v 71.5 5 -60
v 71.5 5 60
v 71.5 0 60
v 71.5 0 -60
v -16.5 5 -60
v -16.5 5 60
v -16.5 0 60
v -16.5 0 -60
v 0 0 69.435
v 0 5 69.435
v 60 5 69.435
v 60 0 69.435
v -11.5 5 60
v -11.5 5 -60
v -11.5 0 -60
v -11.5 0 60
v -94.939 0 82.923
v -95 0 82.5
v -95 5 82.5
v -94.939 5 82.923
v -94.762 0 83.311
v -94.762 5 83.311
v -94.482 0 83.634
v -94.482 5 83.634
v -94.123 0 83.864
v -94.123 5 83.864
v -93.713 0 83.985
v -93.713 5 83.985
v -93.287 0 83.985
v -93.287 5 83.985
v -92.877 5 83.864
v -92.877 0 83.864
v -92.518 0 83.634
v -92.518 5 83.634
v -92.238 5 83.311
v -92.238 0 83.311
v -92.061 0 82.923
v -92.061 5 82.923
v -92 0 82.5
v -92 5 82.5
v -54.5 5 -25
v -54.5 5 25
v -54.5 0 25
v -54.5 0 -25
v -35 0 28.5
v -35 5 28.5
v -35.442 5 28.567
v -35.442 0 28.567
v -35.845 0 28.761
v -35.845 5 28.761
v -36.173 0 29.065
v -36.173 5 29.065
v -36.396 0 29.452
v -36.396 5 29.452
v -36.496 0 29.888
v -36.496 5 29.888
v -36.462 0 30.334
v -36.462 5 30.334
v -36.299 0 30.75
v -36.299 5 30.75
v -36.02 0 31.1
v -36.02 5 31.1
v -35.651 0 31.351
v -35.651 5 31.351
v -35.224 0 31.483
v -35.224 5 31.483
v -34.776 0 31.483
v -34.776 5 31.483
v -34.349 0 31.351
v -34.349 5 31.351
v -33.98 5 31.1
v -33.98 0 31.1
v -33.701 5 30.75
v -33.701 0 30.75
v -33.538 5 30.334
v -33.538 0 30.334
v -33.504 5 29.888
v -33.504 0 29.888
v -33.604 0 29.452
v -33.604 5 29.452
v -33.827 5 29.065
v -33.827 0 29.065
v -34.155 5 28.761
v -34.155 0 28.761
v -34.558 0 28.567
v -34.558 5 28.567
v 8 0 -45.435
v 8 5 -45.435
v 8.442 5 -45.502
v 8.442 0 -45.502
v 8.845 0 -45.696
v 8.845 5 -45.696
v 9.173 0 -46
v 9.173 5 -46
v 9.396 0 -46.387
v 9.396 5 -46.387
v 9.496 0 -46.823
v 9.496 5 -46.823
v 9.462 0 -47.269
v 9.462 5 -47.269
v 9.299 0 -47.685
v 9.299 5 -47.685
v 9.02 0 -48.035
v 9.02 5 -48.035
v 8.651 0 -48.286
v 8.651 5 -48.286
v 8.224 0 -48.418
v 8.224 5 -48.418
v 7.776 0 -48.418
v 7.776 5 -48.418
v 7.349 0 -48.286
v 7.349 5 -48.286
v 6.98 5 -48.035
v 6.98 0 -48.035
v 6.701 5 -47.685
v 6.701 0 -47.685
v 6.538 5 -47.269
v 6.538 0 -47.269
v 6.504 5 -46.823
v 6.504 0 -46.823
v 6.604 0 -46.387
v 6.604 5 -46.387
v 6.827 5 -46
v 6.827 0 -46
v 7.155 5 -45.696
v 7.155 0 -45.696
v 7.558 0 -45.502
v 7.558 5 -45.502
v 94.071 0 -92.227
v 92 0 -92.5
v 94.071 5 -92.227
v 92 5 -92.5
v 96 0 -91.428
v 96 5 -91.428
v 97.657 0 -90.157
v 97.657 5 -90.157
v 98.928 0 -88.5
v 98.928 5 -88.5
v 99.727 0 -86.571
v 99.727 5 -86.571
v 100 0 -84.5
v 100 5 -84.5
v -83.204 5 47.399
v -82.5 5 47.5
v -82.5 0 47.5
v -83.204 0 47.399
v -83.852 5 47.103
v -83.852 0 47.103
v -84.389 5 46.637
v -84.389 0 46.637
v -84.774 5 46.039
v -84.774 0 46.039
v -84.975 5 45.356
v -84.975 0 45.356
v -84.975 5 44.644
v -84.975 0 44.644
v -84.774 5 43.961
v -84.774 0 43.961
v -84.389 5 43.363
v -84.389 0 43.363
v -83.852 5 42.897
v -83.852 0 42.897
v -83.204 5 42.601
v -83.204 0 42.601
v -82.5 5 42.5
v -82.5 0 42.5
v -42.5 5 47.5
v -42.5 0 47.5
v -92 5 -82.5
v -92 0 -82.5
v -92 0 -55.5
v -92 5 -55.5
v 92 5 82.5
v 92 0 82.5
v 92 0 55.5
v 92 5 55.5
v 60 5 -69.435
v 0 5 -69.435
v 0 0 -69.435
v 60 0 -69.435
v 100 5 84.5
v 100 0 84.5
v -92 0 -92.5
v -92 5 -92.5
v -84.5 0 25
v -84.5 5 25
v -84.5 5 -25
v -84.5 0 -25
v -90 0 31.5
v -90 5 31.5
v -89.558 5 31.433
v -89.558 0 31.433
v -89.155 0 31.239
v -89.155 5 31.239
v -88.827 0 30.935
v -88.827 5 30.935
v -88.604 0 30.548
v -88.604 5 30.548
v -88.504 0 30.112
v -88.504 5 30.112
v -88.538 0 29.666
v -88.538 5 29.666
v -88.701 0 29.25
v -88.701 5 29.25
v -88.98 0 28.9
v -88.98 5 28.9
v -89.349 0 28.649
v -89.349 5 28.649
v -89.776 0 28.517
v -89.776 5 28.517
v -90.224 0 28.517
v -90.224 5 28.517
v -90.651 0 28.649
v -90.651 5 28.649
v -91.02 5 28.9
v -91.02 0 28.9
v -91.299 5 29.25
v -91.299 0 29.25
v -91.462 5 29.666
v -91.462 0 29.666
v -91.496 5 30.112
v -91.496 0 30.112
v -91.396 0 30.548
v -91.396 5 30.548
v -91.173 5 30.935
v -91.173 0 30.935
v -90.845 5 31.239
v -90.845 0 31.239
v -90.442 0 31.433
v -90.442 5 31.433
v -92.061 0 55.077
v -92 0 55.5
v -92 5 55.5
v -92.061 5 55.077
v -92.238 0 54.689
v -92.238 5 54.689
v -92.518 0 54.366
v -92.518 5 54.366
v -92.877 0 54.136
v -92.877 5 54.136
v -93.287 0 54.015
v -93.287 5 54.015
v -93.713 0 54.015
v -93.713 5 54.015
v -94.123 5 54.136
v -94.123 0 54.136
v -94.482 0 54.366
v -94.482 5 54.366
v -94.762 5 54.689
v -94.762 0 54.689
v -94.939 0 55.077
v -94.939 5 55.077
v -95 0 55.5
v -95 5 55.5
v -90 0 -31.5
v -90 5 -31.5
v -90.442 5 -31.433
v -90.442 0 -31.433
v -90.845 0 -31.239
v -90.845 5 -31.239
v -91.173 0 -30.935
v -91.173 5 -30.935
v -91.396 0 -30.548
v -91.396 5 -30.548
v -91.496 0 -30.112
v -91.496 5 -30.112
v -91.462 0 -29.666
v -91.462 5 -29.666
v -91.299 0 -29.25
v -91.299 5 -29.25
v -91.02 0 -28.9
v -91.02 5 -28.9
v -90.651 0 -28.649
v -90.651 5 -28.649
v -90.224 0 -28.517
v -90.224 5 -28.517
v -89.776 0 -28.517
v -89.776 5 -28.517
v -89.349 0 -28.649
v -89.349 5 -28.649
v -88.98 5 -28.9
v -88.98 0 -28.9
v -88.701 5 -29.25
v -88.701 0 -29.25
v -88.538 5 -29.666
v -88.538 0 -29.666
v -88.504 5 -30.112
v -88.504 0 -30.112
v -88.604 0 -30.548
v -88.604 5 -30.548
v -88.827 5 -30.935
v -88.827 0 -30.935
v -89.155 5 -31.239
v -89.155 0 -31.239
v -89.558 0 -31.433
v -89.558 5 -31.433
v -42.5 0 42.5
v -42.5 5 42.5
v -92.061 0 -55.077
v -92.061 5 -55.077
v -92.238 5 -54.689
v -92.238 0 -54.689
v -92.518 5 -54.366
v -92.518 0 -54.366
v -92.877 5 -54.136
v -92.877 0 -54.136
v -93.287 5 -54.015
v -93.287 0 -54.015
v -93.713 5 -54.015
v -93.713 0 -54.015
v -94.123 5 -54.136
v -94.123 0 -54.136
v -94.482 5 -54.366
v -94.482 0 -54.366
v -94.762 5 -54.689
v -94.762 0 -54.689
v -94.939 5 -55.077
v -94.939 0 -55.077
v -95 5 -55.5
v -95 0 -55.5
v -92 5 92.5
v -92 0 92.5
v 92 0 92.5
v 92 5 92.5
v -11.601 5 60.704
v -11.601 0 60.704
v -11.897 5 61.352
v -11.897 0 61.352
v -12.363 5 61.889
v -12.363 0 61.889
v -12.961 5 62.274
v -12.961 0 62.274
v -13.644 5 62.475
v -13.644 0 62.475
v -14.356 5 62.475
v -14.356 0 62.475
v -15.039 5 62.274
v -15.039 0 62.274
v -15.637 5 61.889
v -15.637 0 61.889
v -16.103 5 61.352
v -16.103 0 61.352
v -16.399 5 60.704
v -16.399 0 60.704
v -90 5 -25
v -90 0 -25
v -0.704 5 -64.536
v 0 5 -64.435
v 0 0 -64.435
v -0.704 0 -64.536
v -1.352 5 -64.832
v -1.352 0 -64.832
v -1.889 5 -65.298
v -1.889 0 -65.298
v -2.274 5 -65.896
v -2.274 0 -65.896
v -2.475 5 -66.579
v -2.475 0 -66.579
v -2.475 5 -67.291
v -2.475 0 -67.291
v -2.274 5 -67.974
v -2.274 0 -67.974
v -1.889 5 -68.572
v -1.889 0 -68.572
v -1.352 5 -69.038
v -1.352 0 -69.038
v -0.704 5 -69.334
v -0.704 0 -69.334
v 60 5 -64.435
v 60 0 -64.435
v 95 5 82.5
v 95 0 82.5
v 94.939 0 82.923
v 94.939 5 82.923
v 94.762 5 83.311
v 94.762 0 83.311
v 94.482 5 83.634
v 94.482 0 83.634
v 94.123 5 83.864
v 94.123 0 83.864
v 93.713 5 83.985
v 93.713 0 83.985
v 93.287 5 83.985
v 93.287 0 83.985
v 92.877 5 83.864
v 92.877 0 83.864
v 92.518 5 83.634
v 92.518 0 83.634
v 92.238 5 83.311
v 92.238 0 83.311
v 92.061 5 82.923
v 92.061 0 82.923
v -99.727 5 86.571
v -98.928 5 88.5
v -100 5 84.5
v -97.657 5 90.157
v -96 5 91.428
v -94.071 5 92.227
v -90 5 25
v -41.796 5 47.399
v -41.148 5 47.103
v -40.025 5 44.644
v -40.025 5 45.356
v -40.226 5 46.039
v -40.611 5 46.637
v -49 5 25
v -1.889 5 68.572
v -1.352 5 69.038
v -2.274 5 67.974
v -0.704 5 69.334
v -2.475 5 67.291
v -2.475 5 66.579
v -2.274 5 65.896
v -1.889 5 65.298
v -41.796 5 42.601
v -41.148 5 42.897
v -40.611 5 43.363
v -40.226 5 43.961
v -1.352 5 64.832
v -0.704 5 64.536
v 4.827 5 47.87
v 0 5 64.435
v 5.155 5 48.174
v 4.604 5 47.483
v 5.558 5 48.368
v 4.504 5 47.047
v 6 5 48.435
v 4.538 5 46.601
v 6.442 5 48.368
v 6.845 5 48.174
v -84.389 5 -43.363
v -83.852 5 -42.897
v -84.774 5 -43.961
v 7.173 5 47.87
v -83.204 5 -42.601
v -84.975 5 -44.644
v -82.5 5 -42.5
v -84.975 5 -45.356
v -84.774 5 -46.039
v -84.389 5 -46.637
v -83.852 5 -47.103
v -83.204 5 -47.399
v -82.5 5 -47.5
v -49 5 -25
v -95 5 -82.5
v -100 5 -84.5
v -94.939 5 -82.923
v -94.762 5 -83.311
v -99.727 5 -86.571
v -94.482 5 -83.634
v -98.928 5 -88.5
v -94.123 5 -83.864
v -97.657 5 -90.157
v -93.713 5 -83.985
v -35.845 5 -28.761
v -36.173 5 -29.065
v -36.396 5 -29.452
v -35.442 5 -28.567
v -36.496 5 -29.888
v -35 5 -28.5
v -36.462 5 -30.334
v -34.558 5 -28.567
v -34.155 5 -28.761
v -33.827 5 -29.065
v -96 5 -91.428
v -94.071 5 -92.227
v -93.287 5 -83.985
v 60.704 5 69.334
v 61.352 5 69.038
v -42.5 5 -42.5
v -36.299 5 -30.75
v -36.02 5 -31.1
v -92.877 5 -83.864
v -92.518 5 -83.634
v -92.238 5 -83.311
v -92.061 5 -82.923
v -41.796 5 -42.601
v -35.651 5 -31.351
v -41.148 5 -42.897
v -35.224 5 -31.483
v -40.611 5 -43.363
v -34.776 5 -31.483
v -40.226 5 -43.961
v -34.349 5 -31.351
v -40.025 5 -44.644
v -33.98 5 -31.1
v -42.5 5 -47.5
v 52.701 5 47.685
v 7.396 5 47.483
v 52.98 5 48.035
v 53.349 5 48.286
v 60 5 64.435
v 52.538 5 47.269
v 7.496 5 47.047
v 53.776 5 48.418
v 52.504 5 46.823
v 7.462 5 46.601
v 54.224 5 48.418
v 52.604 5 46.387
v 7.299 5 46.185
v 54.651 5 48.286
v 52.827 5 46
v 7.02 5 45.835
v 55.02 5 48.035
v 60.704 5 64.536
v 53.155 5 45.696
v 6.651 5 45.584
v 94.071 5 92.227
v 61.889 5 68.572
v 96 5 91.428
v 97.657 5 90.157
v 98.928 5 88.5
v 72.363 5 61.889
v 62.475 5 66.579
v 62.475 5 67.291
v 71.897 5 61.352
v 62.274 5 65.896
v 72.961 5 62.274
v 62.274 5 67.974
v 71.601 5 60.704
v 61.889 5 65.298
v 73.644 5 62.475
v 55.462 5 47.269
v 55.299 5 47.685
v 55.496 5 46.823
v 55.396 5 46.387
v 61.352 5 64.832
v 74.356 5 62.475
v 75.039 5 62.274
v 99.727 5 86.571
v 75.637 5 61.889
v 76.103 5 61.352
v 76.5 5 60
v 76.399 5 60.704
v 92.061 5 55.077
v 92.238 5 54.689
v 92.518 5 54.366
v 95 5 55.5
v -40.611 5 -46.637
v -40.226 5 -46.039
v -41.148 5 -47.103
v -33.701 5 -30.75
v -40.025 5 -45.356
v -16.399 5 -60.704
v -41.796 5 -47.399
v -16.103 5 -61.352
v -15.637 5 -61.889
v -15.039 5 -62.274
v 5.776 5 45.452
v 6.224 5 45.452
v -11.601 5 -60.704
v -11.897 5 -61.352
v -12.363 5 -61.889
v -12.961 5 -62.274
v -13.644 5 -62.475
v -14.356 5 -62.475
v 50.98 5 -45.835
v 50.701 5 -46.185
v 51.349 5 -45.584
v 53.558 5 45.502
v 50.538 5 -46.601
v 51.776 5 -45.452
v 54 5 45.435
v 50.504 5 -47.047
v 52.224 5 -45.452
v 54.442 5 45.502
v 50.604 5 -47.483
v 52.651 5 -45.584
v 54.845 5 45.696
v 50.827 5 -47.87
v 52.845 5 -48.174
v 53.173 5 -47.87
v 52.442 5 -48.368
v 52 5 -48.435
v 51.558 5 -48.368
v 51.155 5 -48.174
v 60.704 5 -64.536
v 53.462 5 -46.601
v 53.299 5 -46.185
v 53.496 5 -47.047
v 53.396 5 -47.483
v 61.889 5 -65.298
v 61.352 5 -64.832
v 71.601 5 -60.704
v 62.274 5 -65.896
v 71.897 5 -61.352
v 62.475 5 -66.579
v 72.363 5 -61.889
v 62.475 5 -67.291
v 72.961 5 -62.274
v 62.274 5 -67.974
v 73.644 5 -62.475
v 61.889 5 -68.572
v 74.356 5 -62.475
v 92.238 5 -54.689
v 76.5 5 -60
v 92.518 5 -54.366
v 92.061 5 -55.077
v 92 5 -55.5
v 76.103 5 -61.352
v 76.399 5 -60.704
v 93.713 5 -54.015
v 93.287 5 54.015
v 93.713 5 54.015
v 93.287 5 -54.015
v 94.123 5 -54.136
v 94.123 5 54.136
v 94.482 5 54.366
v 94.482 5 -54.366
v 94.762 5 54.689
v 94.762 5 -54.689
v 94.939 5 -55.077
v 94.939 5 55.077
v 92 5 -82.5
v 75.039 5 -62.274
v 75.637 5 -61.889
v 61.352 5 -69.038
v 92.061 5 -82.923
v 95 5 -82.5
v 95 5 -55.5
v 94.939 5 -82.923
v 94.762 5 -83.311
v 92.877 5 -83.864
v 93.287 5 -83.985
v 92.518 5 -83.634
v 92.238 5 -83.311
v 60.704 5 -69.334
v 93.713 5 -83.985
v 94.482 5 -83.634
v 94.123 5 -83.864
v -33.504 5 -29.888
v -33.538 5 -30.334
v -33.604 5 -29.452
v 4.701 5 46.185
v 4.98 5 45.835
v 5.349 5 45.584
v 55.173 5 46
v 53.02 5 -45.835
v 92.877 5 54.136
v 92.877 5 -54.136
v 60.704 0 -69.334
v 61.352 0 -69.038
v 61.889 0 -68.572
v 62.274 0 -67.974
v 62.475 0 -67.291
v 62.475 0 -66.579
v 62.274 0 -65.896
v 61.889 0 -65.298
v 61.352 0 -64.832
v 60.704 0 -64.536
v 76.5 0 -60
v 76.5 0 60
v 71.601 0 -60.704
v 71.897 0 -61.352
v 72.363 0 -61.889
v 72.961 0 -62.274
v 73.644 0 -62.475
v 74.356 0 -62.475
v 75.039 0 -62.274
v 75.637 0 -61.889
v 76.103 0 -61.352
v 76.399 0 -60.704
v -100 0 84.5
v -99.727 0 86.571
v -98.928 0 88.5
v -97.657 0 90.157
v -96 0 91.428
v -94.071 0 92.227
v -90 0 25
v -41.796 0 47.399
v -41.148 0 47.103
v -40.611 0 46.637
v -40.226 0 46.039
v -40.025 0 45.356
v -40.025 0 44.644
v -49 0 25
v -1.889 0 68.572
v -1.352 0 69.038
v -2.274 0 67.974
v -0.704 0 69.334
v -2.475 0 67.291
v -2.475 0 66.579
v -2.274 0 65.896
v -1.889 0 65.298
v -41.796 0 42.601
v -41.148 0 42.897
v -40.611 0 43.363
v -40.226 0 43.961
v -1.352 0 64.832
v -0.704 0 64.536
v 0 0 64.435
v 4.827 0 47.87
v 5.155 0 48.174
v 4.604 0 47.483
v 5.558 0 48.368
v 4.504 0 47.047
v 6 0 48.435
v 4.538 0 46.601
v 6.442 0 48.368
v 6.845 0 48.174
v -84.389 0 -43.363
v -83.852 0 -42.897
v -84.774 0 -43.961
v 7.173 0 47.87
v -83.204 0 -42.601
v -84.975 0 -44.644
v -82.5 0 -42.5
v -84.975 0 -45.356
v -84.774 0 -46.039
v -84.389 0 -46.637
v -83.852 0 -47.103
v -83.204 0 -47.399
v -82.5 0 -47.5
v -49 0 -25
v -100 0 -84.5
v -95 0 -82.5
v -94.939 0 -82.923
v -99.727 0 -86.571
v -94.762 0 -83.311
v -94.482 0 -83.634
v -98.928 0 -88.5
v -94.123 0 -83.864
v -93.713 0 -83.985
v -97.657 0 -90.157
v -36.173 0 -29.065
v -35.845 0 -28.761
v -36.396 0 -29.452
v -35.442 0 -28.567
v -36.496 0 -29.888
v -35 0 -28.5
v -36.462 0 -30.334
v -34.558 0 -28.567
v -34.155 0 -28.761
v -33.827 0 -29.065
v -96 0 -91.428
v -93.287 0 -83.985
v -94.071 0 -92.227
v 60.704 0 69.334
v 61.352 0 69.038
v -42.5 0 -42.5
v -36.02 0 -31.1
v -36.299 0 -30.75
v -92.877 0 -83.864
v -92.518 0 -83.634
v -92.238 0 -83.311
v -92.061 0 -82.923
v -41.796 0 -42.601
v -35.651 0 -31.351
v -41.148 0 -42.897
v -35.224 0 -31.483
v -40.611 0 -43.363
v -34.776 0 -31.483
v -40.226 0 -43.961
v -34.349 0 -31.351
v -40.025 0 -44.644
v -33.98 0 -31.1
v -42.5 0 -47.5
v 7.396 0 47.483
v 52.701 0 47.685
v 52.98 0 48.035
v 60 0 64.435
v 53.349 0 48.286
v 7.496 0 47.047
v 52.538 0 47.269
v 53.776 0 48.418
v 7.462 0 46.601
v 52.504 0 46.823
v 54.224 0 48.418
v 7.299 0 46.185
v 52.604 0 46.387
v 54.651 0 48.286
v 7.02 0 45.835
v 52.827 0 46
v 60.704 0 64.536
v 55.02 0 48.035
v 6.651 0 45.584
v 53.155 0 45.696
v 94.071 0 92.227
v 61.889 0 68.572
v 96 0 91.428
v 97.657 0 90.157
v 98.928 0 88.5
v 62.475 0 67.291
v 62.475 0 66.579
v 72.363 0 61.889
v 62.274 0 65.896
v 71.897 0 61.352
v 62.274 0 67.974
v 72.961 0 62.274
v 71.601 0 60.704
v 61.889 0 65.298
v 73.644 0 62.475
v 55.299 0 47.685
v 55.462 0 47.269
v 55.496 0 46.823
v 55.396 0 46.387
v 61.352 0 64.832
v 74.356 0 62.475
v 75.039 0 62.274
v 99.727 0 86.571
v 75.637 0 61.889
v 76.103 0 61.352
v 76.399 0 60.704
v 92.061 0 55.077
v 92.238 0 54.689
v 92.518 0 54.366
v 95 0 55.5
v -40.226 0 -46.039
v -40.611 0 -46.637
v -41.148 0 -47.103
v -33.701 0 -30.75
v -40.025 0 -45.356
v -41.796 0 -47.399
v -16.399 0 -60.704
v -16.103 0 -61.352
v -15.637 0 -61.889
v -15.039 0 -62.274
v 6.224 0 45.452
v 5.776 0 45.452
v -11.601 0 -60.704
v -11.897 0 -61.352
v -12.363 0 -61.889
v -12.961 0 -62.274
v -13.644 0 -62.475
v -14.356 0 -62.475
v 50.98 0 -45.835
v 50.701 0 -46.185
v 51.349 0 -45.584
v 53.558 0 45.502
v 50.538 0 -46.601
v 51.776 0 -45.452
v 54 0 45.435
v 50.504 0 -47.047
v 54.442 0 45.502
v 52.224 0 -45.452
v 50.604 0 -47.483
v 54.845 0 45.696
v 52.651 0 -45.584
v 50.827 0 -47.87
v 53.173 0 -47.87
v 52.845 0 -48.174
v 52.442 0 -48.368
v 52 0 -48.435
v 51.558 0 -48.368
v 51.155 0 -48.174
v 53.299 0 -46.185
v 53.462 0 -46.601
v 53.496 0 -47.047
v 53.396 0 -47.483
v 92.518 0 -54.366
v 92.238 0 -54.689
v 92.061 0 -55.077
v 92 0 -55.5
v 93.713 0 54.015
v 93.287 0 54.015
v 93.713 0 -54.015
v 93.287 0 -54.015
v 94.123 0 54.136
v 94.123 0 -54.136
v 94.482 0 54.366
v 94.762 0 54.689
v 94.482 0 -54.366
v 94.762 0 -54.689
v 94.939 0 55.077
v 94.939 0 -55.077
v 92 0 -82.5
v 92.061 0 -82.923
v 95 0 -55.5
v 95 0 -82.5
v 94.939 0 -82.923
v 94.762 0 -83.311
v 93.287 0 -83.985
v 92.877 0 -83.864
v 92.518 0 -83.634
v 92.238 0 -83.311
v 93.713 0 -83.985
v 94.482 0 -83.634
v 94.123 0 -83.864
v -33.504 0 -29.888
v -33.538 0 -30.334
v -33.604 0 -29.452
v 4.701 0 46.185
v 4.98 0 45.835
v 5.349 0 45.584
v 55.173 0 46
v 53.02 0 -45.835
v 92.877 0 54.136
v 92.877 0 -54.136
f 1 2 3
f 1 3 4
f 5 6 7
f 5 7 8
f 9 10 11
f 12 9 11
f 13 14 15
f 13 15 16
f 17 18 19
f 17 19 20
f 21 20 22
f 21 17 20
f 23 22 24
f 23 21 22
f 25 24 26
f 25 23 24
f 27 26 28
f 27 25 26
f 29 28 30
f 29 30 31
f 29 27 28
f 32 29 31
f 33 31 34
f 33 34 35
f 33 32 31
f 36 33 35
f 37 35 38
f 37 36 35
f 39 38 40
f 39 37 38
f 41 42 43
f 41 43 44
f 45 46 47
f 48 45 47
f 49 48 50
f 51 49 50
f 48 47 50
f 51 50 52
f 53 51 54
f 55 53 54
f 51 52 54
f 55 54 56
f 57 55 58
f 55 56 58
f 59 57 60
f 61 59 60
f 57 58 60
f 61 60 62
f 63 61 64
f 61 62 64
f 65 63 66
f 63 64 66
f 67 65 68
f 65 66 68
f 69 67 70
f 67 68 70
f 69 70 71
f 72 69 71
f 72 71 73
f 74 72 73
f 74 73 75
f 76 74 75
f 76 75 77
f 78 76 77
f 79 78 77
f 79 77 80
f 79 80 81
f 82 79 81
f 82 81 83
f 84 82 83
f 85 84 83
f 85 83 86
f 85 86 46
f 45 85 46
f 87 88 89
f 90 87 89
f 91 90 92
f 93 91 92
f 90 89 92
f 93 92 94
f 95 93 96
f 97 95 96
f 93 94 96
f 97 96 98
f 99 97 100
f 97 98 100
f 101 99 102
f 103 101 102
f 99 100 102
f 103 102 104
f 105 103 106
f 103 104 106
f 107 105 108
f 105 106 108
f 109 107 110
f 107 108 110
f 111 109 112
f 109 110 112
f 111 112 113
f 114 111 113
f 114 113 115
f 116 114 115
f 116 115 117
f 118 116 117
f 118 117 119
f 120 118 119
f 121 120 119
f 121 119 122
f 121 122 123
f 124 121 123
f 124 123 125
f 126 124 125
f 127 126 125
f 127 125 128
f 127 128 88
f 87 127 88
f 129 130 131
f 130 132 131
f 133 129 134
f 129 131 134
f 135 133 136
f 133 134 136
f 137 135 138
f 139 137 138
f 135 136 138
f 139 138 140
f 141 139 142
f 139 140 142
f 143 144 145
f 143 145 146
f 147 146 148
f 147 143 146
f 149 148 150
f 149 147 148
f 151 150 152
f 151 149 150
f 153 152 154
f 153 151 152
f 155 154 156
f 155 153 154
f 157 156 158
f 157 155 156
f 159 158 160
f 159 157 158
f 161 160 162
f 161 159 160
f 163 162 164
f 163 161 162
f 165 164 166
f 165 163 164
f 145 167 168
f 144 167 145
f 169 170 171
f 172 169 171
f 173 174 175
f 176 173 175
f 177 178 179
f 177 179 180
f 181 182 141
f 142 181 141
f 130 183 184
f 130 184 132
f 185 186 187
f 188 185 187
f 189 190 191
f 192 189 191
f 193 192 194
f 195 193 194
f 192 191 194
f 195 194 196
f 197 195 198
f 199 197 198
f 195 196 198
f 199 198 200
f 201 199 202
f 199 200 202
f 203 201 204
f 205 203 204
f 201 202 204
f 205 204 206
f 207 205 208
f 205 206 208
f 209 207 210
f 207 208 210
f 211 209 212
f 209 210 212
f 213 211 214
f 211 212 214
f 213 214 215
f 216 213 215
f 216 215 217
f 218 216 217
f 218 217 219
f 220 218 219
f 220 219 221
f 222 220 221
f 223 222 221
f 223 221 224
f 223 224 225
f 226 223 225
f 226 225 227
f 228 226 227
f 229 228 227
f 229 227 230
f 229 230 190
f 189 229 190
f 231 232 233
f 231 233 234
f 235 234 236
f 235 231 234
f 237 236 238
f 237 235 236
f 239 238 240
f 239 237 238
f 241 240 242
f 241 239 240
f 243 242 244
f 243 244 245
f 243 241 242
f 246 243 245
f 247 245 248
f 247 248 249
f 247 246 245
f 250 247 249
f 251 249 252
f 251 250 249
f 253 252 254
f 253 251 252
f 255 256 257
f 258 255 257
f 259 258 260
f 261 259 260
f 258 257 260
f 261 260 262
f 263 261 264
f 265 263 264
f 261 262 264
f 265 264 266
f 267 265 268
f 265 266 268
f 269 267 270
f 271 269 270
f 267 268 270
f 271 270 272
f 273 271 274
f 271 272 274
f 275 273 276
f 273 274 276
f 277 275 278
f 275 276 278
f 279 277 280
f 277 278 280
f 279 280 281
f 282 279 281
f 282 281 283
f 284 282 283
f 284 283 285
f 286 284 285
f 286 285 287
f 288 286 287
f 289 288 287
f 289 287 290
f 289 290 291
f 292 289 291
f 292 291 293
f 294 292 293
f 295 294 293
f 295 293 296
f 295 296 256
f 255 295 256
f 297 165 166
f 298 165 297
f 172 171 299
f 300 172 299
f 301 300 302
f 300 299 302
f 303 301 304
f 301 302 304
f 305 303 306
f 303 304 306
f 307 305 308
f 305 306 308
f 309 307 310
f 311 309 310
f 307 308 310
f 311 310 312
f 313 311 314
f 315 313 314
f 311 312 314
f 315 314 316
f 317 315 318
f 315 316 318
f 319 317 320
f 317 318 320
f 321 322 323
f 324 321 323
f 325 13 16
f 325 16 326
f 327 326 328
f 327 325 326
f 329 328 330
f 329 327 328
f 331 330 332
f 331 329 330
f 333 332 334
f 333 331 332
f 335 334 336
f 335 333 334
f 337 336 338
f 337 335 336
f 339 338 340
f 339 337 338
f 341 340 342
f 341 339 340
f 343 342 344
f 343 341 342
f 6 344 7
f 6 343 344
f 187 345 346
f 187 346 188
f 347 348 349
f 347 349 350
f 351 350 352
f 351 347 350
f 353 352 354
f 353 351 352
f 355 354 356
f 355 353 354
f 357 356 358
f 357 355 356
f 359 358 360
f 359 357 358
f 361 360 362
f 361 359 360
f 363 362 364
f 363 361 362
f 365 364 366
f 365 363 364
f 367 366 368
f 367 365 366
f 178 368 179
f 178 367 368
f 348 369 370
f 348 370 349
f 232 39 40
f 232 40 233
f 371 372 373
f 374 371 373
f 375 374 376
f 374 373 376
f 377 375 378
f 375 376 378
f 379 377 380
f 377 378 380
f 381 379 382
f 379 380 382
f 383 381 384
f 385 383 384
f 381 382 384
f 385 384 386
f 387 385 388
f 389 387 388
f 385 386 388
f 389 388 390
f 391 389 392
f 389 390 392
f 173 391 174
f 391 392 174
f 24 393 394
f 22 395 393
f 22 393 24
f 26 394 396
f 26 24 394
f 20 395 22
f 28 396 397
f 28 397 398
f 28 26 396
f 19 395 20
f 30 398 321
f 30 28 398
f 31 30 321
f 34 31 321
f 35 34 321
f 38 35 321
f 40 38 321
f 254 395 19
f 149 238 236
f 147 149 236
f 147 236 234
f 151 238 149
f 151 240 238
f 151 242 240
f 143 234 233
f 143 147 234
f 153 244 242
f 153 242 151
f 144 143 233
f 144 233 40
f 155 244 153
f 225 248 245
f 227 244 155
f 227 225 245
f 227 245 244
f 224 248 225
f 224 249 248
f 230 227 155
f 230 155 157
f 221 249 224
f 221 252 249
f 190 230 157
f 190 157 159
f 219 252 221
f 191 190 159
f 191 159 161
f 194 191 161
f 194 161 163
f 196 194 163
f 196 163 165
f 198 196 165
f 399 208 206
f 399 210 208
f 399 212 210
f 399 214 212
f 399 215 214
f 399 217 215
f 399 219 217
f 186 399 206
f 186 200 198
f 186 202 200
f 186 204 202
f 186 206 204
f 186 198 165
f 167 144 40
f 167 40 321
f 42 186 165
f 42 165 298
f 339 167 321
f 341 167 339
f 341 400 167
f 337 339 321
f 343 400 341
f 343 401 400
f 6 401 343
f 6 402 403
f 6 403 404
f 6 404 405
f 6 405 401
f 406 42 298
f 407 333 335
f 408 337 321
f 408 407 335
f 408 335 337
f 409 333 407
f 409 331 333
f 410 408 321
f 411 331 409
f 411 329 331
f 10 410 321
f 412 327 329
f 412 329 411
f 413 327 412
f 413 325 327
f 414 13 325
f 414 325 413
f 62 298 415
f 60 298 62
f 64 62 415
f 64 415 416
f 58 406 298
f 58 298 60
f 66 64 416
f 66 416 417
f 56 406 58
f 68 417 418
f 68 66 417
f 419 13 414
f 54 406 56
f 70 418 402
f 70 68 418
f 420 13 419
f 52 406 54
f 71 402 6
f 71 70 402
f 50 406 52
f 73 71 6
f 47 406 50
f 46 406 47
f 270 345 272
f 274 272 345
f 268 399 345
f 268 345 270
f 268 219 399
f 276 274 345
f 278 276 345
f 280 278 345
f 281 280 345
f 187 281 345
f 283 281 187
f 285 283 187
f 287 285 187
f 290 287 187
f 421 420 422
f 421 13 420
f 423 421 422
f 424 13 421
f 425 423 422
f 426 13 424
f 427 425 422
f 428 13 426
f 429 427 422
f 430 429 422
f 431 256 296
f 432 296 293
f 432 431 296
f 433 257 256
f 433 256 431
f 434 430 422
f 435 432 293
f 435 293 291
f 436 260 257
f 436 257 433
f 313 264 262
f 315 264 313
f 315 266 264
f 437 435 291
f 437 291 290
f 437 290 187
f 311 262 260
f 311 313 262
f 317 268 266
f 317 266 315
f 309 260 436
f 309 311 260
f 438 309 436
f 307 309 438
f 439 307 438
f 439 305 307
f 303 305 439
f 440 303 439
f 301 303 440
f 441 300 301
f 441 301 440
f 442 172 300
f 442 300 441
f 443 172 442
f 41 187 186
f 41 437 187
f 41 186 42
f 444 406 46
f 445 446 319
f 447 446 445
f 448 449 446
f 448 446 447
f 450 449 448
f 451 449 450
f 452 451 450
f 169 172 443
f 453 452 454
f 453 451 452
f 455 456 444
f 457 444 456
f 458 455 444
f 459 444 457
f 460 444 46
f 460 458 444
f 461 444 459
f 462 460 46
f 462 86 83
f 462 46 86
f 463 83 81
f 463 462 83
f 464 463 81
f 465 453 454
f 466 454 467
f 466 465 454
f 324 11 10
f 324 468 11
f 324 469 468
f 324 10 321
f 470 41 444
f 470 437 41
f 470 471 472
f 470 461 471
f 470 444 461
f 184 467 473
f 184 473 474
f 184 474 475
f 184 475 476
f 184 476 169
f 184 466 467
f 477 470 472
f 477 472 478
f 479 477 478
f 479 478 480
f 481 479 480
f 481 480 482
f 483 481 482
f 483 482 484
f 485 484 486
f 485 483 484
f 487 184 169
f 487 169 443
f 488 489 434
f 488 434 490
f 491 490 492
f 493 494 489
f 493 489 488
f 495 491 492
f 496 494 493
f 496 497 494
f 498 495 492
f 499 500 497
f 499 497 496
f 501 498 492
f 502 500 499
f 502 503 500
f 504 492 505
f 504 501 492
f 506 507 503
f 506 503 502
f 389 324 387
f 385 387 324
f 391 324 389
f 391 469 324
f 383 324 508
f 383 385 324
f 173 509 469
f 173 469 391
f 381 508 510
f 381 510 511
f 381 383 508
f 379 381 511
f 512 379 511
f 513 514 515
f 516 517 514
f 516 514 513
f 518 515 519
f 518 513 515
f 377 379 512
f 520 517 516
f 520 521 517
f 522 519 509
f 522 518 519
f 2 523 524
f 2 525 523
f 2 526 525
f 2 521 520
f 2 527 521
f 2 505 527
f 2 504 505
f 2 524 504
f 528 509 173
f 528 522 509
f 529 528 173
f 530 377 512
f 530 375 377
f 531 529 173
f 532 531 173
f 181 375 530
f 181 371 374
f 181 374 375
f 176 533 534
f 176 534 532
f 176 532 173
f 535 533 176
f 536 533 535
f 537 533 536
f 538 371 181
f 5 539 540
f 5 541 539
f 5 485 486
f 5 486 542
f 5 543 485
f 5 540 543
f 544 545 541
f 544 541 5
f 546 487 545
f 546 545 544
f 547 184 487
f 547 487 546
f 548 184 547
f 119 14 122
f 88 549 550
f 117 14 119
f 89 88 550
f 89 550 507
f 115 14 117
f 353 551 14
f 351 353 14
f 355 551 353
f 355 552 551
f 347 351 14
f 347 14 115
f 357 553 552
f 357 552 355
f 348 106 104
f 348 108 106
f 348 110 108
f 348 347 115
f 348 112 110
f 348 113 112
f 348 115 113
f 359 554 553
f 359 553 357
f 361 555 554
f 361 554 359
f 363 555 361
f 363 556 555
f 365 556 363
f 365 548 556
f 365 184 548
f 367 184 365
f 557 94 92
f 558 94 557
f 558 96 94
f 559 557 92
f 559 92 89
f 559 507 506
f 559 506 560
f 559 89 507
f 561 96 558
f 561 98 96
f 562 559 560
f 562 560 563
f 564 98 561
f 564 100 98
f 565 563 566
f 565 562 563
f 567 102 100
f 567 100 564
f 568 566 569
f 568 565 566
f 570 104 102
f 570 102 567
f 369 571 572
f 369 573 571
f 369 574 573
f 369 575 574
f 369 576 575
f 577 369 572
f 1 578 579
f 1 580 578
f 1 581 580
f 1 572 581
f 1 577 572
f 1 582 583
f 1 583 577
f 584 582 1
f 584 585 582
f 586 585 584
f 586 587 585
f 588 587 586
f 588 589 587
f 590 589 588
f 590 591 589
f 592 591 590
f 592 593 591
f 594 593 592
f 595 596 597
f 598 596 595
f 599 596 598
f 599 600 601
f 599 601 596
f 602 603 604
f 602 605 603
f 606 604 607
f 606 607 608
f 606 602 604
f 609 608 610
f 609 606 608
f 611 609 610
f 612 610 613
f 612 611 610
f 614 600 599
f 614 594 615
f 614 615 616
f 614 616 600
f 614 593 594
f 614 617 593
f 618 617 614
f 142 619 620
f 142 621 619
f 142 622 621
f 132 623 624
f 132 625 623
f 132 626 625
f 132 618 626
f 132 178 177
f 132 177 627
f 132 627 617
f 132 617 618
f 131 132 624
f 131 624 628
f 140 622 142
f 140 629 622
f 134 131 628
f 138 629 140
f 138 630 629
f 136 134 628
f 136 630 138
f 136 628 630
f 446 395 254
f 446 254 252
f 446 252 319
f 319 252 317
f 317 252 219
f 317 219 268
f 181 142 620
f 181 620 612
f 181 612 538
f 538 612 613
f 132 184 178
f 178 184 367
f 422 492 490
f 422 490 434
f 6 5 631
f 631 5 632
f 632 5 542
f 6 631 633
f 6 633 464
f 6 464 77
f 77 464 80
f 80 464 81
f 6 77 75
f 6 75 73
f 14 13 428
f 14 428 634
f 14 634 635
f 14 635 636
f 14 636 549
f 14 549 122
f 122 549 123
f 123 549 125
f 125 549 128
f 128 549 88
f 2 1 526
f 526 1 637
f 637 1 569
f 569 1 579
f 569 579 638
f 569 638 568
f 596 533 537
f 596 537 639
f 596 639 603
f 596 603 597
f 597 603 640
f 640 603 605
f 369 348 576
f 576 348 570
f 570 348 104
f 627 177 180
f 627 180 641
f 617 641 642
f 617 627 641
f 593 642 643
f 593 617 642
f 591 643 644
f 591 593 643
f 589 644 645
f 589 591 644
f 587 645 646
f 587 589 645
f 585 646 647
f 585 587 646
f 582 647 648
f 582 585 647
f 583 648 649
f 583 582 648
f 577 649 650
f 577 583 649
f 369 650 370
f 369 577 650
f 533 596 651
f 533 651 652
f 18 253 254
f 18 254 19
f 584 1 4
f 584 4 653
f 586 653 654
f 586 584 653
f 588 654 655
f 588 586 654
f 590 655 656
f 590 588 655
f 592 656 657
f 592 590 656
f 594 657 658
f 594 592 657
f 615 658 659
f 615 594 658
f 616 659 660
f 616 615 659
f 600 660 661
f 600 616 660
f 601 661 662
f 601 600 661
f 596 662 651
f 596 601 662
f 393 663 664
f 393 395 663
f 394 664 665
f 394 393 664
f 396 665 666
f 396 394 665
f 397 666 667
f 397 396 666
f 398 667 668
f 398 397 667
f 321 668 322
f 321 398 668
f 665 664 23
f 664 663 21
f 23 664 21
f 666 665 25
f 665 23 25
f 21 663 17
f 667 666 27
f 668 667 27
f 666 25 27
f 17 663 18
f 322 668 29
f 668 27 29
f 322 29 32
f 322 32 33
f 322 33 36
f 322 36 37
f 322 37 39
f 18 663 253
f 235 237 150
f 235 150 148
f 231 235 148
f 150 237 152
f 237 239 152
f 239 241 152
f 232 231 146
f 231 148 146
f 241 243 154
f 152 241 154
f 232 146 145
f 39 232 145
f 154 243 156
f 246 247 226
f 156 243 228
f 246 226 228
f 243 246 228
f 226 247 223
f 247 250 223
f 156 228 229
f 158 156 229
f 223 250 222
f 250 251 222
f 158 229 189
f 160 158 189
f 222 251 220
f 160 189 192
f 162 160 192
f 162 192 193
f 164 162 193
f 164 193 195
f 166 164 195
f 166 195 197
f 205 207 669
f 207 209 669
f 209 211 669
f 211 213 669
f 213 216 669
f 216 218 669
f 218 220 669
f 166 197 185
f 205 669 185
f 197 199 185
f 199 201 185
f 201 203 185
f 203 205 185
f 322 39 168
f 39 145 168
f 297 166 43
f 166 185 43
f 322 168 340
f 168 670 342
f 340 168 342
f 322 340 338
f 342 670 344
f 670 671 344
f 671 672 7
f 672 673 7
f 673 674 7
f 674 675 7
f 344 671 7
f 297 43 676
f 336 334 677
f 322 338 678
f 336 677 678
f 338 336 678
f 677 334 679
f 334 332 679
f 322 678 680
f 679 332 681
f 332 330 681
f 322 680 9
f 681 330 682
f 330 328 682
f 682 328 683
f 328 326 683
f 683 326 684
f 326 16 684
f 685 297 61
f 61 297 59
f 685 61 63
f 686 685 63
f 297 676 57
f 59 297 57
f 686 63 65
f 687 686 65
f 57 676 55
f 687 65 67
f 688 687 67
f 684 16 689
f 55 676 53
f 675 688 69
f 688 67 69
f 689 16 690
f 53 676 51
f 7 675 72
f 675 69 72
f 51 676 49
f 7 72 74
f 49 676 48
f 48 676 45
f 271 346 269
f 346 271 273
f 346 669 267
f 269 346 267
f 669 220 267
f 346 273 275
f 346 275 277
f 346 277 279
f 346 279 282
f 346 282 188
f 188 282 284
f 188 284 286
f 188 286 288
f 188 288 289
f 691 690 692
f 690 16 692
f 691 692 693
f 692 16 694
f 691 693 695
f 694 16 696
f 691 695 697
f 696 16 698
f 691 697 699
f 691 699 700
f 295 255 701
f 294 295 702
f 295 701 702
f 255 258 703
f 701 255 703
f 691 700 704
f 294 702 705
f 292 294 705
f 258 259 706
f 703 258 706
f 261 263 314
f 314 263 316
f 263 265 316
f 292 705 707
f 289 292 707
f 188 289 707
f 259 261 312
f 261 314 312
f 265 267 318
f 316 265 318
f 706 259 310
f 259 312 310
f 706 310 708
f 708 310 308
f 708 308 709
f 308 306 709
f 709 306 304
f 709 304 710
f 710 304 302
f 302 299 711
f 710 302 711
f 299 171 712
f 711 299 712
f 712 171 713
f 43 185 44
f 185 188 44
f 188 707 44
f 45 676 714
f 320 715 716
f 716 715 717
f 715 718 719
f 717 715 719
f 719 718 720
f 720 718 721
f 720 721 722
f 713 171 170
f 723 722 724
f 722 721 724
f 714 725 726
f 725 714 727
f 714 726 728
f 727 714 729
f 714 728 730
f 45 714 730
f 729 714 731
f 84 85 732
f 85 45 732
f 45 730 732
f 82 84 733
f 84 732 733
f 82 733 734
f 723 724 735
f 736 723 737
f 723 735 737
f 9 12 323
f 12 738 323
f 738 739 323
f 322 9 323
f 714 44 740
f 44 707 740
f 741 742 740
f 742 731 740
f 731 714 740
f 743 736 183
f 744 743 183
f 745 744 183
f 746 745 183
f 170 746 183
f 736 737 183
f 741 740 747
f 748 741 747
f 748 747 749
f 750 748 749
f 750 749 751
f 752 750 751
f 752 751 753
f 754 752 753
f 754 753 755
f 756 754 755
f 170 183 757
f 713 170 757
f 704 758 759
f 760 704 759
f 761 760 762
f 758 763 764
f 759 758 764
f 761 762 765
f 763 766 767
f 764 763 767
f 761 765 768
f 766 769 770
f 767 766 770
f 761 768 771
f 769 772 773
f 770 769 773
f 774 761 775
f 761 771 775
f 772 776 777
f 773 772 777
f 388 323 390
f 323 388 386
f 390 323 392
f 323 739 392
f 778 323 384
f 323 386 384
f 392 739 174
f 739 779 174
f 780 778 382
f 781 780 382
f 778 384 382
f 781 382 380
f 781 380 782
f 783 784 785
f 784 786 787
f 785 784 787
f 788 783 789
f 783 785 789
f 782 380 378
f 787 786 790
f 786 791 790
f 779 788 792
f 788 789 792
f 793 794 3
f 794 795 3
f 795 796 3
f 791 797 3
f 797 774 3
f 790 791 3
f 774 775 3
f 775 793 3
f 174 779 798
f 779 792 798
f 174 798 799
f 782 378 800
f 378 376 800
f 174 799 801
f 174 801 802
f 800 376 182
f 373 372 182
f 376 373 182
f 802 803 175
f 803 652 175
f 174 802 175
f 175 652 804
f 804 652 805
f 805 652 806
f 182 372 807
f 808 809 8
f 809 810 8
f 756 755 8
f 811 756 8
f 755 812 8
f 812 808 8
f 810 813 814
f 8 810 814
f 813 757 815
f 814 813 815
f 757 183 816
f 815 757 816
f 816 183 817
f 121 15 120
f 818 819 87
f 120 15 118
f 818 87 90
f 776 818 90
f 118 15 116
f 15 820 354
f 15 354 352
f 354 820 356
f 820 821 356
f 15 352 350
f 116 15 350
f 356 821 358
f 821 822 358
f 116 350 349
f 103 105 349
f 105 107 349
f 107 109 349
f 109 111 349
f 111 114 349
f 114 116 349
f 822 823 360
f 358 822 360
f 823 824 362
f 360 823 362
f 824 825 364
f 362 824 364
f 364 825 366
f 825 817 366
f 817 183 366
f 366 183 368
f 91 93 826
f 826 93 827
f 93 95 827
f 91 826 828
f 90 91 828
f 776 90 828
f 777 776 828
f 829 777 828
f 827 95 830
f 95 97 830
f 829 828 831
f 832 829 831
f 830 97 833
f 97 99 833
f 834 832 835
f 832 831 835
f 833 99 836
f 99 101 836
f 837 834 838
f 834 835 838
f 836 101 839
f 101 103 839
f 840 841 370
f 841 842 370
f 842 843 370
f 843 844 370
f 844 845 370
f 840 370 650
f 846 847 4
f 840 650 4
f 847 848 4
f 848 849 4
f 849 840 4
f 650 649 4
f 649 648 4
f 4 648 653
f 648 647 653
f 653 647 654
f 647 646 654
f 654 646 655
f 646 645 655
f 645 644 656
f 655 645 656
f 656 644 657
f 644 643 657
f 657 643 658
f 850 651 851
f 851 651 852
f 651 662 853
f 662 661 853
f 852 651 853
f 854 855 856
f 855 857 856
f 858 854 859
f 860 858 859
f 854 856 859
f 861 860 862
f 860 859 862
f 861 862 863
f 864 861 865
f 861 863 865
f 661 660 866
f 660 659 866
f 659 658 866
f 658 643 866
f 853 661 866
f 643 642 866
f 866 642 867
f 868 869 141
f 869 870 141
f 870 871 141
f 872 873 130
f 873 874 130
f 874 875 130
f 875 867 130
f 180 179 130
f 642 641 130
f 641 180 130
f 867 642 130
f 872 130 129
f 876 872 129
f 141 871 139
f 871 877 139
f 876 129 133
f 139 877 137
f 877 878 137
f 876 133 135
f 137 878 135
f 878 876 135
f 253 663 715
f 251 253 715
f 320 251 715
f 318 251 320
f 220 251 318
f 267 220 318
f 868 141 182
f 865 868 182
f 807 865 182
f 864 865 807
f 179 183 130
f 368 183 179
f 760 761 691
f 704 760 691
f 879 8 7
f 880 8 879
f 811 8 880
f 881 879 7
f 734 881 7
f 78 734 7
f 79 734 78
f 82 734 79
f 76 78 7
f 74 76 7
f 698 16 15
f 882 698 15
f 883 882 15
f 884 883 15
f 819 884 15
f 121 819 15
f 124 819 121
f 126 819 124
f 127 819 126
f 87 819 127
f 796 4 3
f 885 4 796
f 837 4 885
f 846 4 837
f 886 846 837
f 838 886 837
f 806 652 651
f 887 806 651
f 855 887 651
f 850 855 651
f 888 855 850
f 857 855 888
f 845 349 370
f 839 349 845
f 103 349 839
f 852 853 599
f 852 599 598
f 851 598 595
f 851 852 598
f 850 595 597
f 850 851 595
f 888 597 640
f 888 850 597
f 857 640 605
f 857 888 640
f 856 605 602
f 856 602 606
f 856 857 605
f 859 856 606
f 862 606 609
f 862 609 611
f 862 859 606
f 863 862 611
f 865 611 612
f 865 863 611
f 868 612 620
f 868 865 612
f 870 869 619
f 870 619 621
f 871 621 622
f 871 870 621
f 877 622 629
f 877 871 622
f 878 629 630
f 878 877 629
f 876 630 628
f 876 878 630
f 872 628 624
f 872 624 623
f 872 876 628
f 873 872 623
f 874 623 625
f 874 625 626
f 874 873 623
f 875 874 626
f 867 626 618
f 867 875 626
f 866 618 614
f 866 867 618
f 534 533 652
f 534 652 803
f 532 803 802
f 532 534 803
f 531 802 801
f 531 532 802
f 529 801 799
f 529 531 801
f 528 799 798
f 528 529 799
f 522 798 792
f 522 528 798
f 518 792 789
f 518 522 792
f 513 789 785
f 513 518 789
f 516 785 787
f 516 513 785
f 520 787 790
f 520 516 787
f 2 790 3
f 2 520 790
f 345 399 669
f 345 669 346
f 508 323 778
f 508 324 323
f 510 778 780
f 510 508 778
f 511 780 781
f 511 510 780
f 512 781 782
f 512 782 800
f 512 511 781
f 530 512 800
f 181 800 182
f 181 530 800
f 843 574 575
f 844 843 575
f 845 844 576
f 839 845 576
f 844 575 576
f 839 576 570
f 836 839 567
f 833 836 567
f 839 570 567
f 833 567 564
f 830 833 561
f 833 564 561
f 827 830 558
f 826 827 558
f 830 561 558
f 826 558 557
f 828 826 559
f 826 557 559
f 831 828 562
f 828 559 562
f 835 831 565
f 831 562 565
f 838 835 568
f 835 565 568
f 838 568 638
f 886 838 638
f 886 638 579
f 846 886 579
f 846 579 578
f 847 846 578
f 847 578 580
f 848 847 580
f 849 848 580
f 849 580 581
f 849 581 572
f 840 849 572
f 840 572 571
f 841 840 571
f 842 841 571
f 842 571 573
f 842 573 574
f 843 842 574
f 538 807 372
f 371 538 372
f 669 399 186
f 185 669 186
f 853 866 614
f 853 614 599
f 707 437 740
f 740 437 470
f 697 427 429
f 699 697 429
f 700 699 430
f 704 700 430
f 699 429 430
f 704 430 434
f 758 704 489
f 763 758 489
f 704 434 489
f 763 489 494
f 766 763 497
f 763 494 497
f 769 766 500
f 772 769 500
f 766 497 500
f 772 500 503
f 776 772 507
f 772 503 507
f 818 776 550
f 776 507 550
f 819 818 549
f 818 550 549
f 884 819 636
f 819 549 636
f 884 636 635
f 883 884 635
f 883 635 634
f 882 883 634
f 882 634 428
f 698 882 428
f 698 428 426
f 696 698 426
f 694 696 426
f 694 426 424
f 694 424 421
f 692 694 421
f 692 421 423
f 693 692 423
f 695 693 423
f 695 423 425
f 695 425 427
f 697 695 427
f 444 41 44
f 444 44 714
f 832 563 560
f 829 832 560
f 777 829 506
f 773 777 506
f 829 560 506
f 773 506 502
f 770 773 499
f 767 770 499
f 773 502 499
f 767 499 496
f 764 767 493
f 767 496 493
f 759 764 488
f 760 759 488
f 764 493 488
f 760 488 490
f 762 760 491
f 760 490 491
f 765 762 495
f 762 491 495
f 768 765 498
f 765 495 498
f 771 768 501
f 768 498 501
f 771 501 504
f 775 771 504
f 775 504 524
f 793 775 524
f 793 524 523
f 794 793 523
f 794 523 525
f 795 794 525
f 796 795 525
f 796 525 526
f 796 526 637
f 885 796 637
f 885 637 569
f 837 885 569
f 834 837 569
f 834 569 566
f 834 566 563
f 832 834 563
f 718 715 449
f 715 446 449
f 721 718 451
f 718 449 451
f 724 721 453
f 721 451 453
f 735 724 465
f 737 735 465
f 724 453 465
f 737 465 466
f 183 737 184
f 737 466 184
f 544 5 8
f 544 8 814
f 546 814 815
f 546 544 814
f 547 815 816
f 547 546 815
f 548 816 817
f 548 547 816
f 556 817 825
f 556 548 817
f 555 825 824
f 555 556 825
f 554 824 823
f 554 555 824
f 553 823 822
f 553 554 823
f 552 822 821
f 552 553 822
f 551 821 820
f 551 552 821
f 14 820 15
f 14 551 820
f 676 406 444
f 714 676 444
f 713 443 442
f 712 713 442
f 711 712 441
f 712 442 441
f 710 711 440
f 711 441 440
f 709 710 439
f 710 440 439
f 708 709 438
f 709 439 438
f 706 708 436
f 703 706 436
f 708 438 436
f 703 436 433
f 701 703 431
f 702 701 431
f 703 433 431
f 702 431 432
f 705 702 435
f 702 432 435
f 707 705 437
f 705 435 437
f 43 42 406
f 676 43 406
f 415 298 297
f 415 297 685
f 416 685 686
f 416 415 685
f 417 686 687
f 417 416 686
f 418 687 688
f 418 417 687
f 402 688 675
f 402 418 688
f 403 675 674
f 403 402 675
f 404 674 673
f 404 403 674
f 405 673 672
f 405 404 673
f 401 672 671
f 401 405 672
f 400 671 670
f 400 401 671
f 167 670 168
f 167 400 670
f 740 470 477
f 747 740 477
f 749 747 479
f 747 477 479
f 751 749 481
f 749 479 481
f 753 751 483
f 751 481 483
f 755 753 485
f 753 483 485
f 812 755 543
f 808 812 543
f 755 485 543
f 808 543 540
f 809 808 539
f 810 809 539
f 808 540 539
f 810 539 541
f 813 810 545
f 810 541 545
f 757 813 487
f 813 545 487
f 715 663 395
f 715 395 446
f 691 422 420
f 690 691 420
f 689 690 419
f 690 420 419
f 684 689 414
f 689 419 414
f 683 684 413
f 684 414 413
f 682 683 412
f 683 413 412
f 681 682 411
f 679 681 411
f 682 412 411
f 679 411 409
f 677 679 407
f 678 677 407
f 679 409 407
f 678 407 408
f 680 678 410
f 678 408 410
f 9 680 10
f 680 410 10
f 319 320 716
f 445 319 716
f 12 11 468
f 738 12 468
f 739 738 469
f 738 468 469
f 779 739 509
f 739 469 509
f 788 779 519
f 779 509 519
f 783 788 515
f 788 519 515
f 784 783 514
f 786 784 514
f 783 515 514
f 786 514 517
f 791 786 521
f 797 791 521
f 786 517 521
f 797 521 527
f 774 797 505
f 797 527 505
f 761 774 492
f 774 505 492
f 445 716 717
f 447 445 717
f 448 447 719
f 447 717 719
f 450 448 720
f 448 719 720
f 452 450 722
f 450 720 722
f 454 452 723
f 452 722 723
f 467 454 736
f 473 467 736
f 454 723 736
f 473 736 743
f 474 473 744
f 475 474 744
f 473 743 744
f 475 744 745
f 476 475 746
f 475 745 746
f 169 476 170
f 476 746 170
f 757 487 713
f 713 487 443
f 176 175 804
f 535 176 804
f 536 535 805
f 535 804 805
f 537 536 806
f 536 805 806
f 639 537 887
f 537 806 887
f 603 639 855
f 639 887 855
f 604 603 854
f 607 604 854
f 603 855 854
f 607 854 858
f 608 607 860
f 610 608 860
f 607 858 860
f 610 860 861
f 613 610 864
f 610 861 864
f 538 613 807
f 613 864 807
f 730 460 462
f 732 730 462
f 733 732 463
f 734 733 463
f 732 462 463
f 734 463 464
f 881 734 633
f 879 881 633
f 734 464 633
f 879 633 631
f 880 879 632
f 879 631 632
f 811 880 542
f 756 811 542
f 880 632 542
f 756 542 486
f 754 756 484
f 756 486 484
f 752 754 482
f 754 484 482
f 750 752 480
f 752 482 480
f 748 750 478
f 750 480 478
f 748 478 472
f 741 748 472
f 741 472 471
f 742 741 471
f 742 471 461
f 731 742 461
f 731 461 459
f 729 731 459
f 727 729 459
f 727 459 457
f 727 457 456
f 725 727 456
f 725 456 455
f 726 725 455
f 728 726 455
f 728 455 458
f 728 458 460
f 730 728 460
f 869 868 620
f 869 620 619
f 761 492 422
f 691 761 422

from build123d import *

# Parameters (mm, degrees)
SKETCH2_W           = 200
SKETCH2_H           = 185
BOSS_EXTRUDE1_DEPTH = 5
SKETCH3_W           = 5.5
SKETCH3_H           = 50
SKETCH3_R           = 1.5
CUT_EXTRUDE1_DEPTH  = 137.313058802
SKETCH4_R           = 1.5
CUT_EXTRUDE3_DEPTH  = 137.313058802
FILLET1_R           = 8


with BuildPart() as part:
    # Sketch2 → Boss-Extrude1 (new body)
    with BuildSketch(Plane(origin=(0, 0, 0), x_dir=(1, 0, 0), z_dir=(0, 1, 0))):
        Rectangle(SKETCH2_W, SKETCH2_H)
        with BuildLine():
            Line((-95, 55.5), (-95, 82.5))
            ThreePointArc((-95, 82.5), (-93.5, 84), (-92, 82.5))
            Line((-92, 82.5), (-92, 55.5))
            ThreePointArc((-92, 55.5), (-93.5, 54), (-95, 55.5))
        make_face(mode=Mode.SUBTRACT)
        with BuildLine():
            Line((95, 55.5), (95, 82.5))
            ThreePointArc((95, 82.5), (93.5, 84), (92, 82.5))
            Line((92, 82.5), (92, 55.5))
            ThreePointArc((92, 55.5), (93.5, 54), (95, 55.5))
        make_face(mode=Mode.SUBTRACT)
        with BuildLine():
            Line((95, -55.5), (95, -82.5))
            ThreePointArc((95, -82.5), (93.5, -84), (92, -82.5))
            Line((92, -82.5), (92, -55.5))
            ThreePointArc((92, -55.5), (93.5, -54), (95, -55.5))
        make_face(mode=Mode.SUBTRACT)
        with BuildLine():
            Line((-95, -55.5), (-95, -82.5))
            ThreePointArc((-95, -82.5), (-93.5, -84), (-92, -82.5))
            Line((-92, -82.5), (-92, -55.5))
            ThreePointArc((-92, -55.5), (-93.5, -54), (-95, -55.5))
        make_face(mode=Mode.SUBTRACT)
    extrude(amount=BOSS_EXTRUDE1_DEPTH)

    # Sketch3 → Cut-Extrude1 (cut, through all)
    with BuildSketch(Plane(origin=(0, 5, 0), x_dir=(1, 0, 0), z_dir=(0, 1, 0))):
        with BuildLine():
            Line((-82.5, 42.5), (-42.5, 42.5))
            ThreePointArc((-42.5, 42.5), (-40, 45), (-42.5, 47.5))
            Line((-42.5, 47.5), (-82.5, 47.5))
            ThreePointArc((-82.5, 47.5), (-85, 45), (-82.5, 42.5))
        make_face()
        with BuildLine():
            ThreePointArc((-42.5, -42.5), (-40, -45), (-42.5, -47.5))
            Line((-42.5, -47.5), (-82.5, -47.5))
            ThreePointArc((-82.5, -47.5), (-85, -45), (-82.5, -42.5))
            Line((-82.5, -42.5), (-42.5, -42.5))
        make_face()
        with Locations((-87.25, 0)):
            Rectangle(SKETCH3_W, SKETCH3_H)
        with Locations((-51.75, 0)):
            Rectangle(SKETCH3_W, SKETCH3_H)
        with Locations(Location((-90, -30, 0), (0, 0, 270))):
            Circle(SKETCH3_R)
        with Locations(Location((-90, 30, 0), (0, 0, 90))):
            Circle(SKETCH3_R)
        with Locations(Location((-35, -30, 0), (0, 0, 90))):
            Circle(SKETCH3_R)
        with Locations(Location((-35, 30, 0), (0, 0, 270))):
            Circle(SKETCH3_R)
    extrude(amount=-CUT_EXTRUDE1_DEPTH, mode=Mode.SUBTRACT)

    # Sketch4 → Cut-Extrude3 (cut, through all)
    with BuildSketch(Plane(origin=(0, 5, 0), x_dir=(1, 0, 0), z_dir=(0, 1, 0))):
        with Locations(Location((8, 46.935, 0), (0, 0, 270))):
            Circle(SKETCH4_R)
        with Locations(Location((52, 46.935, 0), (0, 0, 90))):
            Circle(SKETCH4_R)
        with Locations(Location((6, -46.935, 0), (0, 0, 270))):
            Circle(SKETCH4_R)
        with Locations(Location((54, -46.935, 0), (0, 0, 90))):
            Circle(SKETCH4_R)
        with BuildLine():
            Line((71.5, -60), (71.5, 60))
            ThreePointArc((71.5, 60), (74, 62.5), (76.5, 60))
            Line((76.5, 60), (76.5, -60))
            ThreePointArc((76.5, -60), (74, -62.5), (71.5, -60))
        make_face()
        with BuildLine():
            Line((-16.5, -60), (-16.5, 60))
            ThreePointArc((-16.5, 60), (-14, 62.5), (-11.5, 60))
            Line((-11.5, 60), (-11.5, -60))
            ThreePointArc((-11.5, -60), (-14, -62.5), (-16.5, -60))
        make_face()
        with BuildLine():
            Line((0, 69.435), (60, 69.435))
            ThreePointArc((60, 69.435), (62.5, 66.935), (60, 64.435))
            Line((60, 64.435), (0, 64.435))
            ThreePointArc((0, 64.435), (-2.5, 66.935), (0, 69.435))
        make_face()
        with BuildLine():
            Line((0, -69.435), (60, -69.435))
            ThreePointArc((60, -69.435), (62.5, -66.935), (60, -64.435))
            Line((60, -64.435), (0, -64.435))
            ThreePointArc((0, -64.435), (-2.5, -66.935), (0, -69.435))
        make_face()
    extrude(amount=-CUT_EXTRUDE3_DEPTH, mode=Mode.SUBTRACT)

    # Fillet1
    fillet1_edges = [part.edges().sort_by_distance(p)[0] for p in [
        (100, 2.5, 92.5),
        (-100, 2.5, 92.5),
        (-100, 2.5, -92.5),
        (100, 2.5, -92.5),
    ]]
    fillet(fillet1_edges, radius=FILLET1_R)


solid = part.part
